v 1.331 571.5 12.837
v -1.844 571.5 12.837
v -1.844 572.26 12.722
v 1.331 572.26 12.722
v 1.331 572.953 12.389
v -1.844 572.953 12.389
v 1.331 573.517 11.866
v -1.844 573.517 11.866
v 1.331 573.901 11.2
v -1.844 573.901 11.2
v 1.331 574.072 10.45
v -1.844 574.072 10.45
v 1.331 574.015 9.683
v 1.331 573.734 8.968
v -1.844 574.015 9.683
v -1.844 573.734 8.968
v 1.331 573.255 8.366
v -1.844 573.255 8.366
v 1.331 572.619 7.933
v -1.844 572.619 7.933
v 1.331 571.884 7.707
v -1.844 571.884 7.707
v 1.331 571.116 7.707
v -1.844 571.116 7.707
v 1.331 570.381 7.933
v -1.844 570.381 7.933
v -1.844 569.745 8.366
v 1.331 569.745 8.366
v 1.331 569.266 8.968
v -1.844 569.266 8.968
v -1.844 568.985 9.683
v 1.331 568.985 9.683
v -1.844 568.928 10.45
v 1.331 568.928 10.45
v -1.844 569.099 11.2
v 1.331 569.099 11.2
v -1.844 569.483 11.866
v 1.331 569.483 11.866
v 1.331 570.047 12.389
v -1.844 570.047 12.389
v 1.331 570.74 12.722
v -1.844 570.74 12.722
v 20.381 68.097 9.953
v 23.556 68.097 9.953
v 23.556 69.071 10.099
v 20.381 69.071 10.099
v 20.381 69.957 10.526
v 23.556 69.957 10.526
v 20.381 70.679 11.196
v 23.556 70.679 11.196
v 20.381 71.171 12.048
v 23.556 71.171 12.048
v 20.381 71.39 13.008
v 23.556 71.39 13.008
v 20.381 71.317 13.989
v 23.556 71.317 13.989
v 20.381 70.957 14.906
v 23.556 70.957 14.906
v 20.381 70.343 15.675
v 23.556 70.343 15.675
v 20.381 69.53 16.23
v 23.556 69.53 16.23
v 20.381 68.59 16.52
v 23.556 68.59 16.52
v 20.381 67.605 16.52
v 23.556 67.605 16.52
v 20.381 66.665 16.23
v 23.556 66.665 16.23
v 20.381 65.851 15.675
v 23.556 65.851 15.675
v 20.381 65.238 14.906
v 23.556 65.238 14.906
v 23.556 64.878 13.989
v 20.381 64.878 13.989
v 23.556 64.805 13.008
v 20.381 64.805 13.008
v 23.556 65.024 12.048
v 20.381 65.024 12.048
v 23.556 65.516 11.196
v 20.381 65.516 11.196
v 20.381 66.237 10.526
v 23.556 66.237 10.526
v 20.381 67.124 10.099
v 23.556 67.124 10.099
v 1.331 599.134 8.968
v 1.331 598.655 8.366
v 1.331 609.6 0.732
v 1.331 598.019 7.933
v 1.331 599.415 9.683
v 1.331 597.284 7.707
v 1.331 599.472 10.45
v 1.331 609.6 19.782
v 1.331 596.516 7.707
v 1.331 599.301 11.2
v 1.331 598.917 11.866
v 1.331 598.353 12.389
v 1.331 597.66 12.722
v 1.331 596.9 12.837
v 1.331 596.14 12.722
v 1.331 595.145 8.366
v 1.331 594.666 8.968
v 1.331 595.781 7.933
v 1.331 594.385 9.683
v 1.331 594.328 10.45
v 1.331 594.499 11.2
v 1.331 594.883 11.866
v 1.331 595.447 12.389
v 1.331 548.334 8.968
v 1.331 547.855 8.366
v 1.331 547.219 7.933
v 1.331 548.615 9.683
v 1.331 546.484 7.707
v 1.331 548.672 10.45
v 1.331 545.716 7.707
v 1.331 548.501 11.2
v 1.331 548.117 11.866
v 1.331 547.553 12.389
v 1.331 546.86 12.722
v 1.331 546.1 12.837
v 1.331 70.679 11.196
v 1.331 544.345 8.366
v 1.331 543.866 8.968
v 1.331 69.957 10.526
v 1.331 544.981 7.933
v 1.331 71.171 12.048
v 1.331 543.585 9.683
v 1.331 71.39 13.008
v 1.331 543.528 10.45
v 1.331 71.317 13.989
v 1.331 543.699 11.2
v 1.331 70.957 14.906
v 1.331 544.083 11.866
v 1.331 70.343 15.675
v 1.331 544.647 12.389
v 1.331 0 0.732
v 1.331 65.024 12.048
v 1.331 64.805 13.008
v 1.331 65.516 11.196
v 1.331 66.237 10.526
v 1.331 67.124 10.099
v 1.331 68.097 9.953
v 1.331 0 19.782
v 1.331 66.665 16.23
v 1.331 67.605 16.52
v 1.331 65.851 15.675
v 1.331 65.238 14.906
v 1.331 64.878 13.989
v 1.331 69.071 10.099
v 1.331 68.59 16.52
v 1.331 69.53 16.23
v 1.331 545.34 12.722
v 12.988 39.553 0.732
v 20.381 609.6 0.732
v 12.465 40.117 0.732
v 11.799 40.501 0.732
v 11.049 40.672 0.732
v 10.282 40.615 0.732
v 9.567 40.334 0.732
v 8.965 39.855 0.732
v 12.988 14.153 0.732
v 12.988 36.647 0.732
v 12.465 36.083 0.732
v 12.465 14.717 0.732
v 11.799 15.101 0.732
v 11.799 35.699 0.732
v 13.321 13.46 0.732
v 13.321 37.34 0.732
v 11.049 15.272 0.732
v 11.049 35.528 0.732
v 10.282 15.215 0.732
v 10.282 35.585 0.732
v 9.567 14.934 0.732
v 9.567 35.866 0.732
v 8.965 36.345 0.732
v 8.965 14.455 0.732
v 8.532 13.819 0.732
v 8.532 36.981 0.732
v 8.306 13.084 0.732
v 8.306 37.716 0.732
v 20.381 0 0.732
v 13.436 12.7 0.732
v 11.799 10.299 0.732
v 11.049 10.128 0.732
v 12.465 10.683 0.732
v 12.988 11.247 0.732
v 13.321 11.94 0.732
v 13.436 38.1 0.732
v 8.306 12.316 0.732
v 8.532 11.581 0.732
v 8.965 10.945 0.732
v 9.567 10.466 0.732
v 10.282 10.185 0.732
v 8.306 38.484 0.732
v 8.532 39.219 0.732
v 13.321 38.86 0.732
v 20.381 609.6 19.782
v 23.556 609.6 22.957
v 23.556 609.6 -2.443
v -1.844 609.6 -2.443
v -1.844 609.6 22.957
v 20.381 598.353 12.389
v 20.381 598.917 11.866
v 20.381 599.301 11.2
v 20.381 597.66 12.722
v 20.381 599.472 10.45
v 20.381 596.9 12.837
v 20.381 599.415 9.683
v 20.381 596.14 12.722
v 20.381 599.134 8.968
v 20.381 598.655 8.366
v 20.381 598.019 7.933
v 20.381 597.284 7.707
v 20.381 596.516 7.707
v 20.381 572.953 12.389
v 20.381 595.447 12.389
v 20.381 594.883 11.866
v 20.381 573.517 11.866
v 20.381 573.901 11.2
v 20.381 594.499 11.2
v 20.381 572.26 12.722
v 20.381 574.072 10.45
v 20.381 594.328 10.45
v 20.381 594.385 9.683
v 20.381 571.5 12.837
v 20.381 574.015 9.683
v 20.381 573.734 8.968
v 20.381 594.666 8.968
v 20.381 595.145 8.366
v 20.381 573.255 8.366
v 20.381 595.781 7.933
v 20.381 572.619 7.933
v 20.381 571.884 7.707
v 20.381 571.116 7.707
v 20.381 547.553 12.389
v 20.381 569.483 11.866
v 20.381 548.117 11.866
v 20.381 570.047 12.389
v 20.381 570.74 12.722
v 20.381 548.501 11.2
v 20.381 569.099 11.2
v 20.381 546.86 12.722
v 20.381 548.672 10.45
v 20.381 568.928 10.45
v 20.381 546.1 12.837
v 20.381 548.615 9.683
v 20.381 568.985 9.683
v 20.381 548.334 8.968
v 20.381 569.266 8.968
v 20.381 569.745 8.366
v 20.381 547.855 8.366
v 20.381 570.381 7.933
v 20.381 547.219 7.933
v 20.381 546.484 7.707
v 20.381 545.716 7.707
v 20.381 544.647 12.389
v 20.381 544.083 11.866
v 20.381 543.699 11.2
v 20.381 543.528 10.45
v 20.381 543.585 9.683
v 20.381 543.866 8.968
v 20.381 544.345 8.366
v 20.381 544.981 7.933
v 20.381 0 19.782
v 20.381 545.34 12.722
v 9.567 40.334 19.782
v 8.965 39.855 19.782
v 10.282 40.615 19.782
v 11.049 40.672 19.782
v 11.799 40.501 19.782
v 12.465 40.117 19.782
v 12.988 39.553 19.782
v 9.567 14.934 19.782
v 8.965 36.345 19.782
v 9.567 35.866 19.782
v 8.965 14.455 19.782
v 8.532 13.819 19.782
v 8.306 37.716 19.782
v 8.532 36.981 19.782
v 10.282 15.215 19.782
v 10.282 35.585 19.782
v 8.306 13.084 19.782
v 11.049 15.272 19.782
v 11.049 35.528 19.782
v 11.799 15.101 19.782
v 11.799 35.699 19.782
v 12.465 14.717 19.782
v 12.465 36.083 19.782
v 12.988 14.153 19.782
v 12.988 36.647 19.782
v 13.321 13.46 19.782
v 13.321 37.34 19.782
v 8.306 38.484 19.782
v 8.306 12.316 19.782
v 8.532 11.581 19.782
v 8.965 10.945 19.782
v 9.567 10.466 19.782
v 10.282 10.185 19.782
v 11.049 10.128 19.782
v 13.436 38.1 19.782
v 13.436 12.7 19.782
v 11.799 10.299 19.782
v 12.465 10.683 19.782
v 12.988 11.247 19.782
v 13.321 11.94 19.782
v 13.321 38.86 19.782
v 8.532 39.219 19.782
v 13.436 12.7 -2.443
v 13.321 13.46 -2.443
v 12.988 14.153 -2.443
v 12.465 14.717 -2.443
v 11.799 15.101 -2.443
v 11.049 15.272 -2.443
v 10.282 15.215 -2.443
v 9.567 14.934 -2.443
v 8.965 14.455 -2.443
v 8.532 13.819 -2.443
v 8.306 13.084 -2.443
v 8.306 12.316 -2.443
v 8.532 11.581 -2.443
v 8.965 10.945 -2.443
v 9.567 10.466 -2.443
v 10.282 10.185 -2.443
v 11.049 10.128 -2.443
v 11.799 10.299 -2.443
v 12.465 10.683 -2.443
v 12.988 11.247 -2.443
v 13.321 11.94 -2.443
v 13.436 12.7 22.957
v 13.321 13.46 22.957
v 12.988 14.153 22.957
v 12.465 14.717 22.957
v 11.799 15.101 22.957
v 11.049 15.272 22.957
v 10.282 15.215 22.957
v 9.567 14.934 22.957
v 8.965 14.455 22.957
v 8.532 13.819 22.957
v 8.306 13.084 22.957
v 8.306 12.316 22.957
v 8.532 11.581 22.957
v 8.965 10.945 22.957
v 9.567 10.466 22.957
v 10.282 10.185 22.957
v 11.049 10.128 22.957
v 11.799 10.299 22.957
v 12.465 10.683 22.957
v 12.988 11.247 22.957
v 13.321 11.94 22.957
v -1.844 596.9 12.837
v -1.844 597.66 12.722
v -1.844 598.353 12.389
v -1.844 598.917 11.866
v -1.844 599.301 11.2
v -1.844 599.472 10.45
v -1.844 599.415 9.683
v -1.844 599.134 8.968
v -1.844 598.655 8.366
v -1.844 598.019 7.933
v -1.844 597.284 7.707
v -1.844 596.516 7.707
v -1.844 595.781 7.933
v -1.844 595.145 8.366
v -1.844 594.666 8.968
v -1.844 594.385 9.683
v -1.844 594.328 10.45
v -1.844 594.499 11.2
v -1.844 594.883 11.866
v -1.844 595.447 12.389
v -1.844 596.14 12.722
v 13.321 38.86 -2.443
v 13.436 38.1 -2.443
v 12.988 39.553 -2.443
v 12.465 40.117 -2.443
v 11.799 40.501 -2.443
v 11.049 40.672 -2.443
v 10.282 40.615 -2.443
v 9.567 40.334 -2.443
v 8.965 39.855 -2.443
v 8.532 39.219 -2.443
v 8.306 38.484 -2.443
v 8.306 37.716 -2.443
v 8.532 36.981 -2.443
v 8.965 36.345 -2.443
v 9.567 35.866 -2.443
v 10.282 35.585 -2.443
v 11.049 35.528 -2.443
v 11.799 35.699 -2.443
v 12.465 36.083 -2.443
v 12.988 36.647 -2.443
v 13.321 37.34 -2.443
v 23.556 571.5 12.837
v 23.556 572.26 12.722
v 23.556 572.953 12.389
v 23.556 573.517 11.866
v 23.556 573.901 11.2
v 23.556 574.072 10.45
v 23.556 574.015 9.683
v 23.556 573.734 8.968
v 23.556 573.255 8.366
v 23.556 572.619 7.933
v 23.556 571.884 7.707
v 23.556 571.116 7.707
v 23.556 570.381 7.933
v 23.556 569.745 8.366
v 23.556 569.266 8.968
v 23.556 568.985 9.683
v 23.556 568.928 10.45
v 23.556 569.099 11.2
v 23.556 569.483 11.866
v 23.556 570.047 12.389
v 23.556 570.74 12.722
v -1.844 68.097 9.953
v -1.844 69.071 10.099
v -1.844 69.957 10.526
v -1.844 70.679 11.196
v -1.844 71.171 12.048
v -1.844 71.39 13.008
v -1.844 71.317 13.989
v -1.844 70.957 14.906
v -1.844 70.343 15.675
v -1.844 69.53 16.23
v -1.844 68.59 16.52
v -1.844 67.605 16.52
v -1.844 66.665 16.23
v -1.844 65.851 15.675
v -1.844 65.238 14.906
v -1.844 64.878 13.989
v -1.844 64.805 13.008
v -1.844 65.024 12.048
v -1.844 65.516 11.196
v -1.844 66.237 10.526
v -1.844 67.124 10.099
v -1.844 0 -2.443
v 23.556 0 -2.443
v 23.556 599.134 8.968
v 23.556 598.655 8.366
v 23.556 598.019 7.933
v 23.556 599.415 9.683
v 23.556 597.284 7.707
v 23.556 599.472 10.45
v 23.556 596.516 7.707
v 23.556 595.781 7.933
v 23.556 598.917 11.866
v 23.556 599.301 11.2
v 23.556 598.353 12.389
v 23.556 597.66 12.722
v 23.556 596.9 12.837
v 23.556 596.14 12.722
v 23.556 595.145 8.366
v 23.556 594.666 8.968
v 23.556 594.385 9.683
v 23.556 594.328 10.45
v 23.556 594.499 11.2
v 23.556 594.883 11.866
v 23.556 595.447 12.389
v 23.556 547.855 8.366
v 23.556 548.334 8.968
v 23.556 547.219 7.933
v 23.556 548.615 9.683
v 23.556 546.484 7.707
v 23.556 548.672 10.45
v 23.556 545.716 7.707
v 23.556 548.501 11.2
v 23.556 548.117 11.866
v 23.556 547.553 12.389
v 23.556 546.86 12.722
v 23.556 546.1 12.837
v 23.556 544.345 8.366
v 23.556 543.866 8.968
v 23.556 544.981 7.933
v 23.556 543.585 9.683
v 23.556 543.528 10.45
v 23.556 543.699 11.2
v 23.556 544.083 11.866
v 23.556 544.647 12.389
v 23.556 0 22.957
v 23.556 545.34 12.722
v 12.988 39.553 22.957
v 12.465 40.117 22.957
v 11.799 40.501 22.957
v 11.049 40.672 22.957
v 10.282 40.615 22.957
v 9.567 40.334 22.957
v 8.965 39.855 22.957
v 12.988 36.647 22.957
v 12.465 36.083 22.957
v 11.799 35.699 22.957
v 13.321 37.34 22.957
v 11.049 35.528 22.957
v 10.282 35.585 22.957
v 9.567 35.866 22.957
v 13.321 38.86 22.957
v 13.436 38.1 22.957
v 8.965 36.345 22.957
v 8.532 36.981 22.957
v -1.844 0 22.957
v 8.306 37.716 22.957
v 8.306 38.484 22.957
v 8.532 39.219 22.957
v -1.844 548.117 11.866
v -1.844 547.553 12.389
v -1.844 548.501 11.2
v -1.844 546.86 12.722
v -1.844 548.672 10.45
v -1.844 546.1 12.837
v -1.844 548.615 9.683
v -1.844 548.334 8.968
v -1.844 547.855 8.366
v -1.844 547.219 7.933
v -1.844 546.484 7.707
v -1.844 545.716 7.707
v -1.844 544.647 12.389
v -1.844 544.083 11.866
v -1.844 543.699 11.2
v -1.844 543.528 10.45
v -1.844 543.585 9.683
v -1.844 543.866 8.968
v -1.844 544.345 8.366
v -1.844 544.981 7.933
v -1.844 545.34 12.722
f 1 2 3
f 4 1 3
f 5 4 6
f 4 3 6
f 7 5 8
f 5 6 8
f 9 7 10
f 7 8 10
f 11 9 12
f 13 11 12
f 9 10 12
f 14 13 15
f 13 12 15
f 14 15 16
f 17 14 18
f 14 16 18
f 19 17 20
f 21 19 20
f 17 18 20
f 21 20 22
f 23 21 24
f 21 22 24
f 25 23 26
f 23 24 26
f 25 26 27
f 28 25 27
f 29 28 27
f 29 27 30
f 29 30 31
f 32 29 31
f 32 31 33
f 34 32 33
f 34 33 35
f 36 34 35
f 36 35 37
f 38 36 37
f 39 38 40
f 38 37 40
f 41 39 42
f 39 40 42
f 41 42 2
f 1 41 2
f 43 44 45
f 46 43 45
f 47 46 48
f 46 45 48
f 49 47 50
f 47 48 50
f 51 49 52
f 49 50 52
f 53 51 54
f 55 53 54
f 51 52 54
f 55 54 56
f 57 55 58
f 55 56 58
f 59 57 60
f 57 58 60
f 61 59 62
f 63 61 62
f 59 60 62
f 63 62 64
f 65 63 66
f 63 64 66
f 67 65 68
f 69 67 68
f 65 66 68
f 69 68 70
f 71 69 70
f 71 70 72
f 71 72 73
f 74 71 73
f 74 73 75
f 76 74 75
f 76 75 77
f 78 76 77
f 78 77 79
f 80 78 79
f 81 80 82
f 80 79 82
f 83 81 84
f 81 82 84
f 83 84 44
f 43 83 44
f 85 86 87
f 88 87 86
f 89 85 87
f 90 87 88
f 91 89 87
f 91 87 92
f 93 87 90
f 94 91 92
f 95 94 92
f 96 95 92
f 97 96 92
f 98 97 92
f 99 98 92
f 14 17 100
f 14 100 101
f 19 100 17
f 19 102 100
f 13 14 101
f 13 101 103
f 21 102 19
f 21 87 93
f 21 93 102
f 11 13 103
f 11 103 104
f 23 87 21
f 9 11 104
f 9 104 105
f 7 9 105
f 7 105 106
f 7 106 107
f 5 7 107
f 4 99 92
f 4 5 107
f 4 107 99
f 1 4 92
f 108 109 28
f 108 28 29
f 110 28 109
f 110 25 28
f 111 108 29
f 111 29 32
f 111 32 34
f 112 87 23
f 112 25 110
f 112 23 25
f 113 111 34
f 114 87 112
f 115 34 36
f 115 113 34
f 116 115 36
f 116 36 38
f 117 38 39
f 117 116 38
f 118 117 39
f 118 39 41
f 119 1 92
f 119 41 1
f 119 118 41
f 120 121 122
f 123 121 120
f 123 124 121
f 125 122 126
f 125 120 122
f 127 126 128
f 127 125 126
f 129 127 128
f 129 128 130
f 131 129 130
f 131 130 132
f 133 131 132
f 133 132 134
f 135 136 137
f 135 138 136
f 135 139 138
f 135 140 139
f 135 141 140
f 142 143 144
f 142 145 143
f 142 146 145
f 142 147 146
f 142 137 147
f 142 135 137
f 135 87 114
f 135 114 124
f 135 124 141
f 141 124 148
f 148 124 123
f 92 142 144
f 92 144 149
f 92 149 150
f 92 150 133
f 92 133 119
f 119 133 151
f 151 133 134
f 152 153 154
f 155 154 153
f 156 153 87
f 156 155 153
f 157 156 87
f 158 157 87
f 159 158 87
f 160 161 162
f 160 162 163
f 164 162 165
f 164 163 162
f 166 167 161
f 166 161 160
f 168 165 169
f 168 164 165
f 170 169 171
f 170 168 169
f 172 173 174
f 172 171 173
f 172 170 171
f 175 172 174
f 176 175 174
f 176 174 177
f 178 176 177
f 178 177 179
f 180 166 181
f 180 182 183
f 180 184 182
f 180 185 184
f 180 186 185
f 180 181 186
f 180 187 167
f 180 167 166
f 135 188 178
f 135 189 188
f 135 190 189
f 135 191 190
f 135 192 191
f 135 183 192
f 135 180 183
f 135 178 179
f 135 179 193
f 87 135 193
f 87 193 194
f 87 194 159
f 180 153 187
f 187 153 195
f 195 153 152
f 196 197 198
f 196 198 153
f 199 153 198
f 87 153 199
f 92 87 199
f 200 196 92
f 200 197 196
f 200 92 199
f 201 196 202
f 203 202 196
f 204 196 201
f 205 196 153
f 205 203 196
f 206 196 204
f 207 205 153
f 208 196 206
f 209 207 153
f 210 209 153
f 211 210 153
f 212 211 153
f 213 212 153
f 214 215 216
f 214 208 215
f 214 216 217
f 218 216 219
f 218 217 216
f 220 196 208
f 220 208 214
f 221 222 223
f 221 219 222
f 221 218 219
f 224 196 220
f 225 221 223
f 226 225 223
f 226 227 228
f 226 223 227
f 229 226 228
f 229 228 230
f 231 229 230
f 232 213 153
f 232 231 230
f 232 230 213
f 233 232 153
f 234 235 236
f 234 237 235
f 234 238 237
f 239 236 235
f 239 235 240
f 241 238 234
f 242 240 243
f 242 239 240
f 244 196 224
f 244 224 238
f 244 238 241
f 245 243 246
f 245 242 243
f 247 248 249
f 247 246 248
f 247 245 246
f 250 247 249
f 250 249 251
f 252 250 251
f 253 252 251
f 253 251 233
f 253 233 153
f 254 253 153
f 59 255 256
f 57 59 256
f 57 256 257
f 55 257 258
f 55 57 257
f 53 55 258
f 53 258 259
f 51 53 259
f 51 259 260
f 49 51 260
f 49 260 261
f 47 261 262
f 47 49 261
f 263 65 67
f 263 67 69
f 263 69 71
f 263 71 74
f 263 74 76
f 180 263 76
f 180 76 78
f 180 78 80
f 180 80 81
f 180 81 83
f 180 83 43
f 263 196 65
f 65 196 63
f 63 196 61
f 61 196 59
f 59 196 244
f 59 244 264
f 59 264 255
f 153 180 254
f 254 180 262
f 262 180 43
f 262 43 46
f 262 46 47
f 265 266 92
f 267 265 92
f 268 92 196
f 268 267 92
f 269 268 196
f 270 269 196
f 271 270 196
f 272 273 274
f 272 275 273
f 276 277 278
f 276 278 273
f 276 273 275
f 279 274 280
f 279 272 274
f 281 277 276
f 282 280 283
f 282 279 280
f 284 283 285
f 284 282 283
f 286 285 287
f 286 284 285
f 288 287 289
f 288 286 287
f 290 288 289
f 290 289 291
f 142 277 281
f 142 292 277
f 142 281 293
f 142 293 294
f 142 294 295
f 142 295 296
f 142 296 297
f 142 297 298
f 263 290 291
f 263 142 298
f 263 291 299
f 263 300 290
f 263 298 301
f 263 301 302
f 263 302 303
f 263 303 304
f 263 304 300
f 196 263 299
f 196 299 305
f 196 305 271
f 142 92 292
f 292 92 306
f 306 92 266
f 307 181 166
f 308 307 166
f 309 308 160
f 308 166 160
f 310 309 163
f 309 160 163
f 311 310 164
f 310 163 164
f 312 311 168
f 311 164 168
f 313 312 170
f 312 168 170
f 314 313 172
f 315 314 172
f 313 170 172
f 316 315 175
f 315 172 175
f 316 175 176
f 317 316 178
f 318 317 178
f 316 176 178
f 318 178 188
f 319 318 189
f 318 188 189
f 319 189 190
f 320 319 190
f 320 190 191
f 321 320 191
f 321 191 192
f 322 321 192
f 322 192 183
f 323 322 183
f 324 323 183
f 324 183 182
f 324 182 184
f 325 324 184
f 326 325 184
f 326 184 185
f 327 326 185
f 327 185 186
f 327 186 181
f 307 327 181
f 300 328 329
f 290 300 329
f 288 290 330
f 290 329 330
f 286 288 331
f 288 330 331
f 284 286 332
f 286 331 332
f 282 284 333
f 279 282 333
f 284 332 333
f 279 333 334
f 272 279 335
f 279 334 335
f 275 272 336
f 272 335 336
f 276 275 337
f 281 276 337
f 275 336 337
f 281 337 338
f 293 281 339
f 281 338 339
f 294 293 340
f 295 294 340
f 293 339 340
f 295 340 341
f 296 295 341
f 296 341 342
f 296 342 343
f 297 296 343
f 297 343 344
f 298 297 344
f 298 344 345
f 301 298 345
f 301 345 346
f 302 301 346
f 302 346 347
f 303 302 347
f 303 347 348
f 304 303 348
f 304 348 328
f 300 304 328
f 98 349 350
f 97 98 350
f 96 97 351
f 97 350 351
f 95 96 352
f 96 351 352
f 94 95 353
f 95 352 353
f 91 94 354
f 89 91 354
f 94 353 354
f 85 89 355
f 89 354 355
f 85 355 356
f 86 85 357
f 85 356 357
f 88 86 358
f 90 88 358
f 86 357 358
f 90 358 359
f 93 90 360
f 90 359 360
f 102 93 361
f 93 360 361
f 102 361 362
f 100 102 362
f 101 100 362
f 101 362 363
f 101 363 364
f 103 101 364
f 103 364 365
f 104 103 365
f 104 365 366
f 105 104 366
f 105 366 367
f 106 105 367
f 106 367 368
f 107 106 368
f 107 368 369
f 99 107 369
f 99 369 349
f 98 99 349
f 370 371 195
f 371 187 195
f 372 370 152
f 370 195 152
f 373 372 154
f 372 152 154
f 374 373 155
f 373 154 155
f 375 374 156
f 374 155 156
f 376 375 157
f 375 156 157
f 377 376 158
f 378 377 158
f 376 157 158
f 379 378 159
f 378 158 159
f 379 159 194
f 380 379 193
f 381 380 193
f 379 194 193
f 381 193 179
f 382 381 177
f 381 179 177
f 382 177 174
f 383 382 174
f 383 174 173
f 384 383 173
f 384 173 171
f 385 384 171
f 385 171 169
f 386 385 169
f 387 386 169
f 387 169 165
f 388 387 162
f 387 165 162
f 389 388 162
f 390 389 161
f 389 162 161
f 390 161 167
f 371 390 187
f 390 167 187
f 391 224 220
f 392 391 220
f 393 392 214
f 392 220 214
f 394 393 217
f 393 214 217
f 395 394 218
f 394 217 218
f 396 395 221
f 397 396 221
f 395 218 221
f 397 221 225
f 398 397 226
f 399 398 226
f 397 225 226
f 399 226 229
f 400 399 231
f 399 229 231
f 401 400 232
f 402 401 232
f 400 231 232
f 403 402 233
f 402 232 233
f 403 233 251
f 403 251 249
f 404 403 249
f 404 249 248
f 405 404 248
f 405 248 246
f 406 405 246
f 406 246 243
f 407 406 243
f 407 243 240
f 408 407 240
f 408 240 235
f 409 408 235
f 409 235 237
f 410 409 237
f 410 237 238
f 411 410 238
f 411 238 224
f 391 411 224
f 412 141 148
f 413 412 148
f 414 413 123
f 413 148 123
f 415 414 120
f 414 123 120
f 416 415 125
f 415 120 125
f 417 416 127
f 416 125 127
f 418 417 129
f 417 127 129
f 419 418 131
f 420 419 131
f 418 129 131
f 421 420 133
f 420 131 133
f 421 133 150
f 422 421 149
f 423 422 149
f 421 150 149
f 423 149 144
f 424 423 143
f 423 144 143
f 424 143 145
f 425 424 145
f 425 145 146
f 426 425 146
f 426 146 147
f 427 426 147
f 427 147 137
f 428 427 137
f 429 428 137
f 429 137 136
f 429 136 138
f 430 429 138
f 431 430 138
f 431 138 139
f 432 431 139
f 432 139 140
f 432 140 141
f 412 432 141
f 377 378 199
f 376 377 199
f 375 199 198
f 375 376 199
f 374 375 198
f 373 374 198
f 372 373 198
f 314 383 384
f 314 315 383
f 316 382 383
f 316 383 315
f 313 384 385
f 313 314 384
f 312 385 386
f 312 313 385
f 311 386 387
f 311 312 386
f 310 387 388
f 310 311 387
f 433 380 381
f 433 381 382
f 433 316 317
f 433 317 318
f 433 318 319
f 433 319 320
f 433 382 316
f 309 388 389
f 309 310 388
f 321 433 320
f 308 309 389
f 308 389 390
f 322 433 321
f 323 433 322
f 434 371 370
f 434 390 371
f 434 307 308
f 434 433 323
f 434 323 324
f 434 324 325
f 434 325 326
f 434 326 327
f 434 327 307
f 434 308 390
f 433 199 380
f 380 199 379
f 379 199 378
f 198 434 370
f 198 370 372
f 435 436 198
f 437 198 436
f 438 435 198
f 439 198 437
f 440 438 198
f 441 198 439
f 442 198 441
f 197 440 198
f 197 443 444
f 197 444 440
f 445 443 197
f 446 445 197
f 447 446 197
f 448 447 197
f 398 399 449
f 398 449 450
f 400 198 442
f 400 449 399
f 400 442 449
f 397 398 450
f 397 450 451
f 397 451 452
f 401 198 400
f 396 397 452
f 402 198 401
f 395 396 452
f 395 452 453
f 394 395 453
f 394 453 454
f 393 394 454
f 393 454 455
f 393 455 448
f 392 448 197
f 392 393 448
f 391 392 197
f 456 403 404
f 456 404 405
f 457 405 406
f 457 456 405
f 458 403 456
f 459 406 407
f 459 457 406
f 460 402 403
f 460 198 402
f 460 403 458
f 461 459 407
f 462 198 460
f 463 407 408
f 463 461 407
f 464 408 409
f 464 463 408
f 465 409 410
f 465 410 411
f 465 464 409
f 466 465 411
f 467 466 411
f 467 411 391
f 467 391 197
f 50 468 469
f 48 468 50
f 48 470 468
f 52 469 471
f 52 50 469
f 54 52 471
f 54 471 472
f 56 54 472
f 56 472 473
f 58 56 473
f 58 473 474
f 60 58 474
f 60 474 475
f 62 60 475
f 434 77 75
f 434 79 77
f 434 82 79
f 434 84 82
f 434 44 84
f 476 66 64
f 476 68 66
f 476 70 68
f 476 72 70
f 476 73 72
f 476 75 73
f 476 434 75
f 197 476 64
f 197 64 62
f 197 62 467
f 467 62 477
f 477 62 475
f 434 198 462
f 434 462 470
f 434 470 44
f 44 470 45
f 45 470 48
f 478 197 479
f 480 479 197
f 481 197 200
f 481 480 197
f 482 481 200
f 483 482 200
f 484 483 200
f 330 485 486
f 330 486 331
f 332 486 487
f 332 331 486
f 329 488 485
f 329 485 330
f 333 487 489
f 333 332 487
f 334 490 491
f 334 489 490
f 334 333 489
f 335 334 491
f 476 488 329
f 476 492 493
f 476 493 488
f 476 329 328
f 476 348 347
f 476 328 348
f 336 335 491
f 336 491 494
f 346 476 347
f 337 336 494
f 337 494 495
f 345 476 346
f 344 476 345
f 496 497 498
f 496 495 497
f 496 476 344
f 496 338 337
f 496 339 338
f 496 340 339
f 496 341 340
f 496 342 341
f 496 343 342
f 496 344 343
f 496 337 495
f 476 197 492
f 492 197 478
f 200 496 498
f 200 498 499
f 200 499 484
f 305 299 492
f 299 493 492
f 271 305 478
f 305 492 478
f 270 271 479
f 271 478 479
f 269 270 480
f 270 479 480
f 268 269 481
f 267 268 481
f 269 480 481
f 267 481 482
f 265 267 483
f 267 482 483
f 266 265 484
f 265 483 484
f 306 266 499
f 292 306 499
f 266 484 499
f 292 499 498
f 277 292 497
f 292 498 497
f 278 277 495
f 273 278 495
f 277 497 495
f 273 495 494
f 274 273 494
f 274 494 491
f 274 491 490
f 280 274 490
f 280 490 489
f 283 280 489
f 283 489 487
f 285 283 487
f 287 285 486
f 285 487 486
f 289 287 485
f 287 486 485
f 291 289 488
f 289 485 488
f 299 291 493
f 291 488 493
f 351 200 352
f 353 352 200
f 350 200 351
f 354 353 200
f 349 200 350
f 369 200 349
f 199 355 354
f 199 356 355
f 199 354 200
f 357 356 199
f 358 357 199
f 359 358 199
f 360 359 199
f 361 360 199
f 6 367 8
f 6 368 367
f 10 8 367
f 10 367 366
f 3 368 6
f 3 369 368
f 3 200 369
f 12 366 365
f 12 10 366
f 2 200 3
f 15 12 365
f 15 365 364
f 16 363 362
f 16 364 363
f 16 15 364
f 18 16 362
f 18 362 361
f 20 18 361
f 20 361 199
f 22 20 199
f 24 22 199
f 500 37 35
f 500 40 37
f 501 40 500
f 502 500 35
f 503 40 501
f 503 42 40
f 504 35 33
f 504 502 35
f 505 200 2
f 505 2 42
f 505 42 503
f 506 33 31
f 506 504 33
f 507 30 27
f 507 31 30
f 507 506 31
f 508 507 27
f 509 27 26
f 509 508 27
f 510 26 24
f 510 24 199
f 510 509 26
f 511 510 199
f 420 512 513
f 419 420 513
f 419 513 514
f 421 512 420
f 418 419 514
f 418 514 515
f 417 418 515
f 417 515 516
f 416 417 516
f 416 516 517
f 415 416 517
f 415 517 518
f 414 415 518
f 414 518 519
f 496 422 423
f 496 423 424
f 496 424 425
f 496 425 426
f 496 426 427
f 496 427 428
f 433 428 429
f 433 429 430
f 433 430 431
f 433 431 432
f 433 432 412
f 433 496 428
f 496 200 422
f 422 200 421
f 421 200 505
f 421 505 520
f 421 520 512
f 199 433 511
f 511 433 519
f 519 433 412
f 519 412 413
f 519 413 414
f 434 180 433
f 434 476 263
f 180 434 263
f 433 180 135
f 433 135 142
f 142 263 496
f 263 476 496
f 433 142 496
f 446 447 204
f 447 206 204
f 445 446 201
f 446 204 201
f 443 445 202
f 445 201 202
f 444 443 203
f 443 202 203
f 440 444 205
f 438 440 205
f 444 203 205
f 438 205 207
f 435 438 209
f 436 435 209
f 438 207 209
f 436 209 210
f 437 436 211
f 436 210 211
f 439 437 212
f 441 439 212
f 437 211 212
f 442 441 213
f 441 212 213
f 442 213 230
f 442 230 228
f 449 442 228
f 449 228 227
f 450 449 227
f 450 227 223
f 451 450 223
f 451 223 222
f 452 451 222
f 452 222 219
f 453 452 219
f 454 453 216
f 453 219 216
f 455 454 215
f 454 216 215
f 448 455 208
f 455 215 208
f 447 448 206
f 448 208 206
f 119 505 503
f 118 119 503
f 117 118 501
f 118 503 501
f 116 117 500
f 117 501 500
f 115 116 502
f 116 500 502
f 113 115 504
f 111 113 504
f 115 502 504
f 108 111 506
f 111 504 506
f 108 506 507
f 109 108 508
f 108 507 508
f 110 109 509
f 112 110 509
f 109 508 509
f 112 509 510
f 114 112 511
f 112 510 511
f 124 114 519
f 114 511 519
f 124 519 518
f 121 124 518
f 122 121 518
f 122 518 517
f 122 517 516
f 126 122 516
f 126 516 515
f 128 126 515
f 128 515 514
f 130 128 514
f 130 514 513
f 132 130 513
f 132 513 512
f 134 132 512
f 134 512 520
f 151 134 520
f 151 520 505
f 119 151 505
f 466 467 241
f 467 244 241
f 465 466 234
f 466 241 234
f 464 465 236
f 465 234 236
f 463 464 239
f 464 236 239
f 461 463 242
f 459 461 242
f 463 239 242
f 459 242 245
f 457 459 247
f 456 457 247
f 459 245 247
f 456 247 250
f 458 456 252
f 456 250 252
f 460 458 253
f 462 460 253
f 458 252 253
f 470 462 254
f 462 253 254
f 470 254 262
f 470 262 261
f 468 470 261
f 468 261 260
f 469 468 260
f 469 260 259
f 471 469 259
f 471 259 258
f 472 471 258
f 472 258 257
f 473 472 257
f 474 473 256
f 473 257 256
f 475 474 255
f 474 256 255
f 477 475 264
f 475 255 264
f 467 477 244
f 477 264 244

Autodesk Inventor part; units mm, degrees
ref_plane "YZ Plane" through (0, 0, 0) normal (1, 0, 0) x (0, 1, 0)
ref_plane "XZ Plane" through (0, 0, 0) normal (0, 1, 0) x (-1, 0, 0)
ref_plane "XY Plane" through (0, 0, 0) normal (0, 0, 1) x (1, 0, 0)
sketch "Sketch1" plane through (0, 0, 0) normal (0, 1, 0) x (-1, 0, 0)
  line L0 (1.8436, -2.4426) -> (-23.5564, -2.4426)
  line L1 (-23.5564, -2.4426) -> (-23.5564, 22.9574)
  line L2 (-23.5564, 22.9574) -> (1.8436, 22.9574)
  line L3 (1.8436, 22.9574) -> (1.8436, -2.4426)
  line L4 (-20.3814, 0.7324) -> (-1.3314, 0.7324)
  line L5 (-1.3314, 0.7324) -> (-1.3314, 19.7824)
  line L6 (-1.3314, 19.7824) -> (-20.3814, 19.7824)
  line L7 (-20.3814, 19.7824) -> (-20.3814, 0.7324)
  point P0 (0, 0)
  dimension "d0" = 25.4
  dimension "d1" = 25.4
  dimension "d2" = 3.175
extrude "Extrusion1" add sketch "Sketch1" along normal blind 609.6
sketch "Sketch2" plane through (-1.8436, 0, -2.4426) normal (-1, 0, 0) x (0, 0, 1)
  line L0 (22.225, 0) -> (3.175, 0) construction
  line L1 (12.7, 0) -> (12.7, 12.7) construction
  line L2 (12.7, 12.7) -> (12.7, 38.1) construction
  line L3 (3.175, 609.6) -> (22.225, 609.6) construction
  line L4 (12.7, 609.6) -> (12.7, 596.9) construction
  line L5 (12.7, 596.9) -> (12.7, 571.5) construction
  circle A0 centre (12.7, 596.9) radius 2.5797
  circle A1 centre (12.7, 571.5) radius 2.5797
  line L6 (12.7, 571.5) -> (12.7, 546.1) construction
  circle A2 centre (12.7, 546.1) radius 2.5797
  point P0 (2.4426, 0)
  dimension "d5" = 12.7
  dimension "d6" = 25.4
  dimension "d7" = 12.7
  dimension "d8" = 25.4
  dimension "d9" = 5.1594
  dimension "d10" = 5.1594
  dimension "d30" = 25.4
  dimension "d31" = 5.1594
sketch "Sketch4" plane through (-1.8436, 0, 22.9574) normal (0, 0, 1) x (1, 0, 0)
  line L0 (0, 0) -> (25.4, 0) construction
  line L1 (12.7, 0) -> (12.7, 12.7) construction
  line L2 (12.7, 12.7) -> (12.7, 38.1) construction
  circle A0 centre (12.7, 12.7) radius 2.5797
  circle A1 centre (12.7, 38.1) radius 2.5797
  point P0 (1.8436, 0)
  dimension "d19" = 12.7
  dimension "d20" = 25.4
  dimension "d21" = 5.1594
  dimension "d22" = 5.1594
extrude "Extrusion4" cut sketch "Sketch4" against normal blind 127
sketch "Sketch5" plane through (23.5564, 0, 22.9574) normal (1, 0, 0) x (0, 0, -1)
  line L0 (0, 0) -> (25.4, 0) construction
  line L1 (0, 0) -> (9.7028, 0) construction
  line L2 (9.7028, 0) -> (9.7028, 68.0974) construction
  circle A0 centre (9.7028, 68.0974) radius 3.302
  point P0 (22.9574, 0)
  dimension "d25" = 9.7028
  dimension "d26" = 68.0974
  dimension "d27" = 6.604
extrude "Extrusion5" cut sketch "Sketch5" against normal blind 50.8
extrude "Extrusion6" cut sketch "Sketch2" against normal blind 25.4
properties part number "25in 1x1 Beam"
